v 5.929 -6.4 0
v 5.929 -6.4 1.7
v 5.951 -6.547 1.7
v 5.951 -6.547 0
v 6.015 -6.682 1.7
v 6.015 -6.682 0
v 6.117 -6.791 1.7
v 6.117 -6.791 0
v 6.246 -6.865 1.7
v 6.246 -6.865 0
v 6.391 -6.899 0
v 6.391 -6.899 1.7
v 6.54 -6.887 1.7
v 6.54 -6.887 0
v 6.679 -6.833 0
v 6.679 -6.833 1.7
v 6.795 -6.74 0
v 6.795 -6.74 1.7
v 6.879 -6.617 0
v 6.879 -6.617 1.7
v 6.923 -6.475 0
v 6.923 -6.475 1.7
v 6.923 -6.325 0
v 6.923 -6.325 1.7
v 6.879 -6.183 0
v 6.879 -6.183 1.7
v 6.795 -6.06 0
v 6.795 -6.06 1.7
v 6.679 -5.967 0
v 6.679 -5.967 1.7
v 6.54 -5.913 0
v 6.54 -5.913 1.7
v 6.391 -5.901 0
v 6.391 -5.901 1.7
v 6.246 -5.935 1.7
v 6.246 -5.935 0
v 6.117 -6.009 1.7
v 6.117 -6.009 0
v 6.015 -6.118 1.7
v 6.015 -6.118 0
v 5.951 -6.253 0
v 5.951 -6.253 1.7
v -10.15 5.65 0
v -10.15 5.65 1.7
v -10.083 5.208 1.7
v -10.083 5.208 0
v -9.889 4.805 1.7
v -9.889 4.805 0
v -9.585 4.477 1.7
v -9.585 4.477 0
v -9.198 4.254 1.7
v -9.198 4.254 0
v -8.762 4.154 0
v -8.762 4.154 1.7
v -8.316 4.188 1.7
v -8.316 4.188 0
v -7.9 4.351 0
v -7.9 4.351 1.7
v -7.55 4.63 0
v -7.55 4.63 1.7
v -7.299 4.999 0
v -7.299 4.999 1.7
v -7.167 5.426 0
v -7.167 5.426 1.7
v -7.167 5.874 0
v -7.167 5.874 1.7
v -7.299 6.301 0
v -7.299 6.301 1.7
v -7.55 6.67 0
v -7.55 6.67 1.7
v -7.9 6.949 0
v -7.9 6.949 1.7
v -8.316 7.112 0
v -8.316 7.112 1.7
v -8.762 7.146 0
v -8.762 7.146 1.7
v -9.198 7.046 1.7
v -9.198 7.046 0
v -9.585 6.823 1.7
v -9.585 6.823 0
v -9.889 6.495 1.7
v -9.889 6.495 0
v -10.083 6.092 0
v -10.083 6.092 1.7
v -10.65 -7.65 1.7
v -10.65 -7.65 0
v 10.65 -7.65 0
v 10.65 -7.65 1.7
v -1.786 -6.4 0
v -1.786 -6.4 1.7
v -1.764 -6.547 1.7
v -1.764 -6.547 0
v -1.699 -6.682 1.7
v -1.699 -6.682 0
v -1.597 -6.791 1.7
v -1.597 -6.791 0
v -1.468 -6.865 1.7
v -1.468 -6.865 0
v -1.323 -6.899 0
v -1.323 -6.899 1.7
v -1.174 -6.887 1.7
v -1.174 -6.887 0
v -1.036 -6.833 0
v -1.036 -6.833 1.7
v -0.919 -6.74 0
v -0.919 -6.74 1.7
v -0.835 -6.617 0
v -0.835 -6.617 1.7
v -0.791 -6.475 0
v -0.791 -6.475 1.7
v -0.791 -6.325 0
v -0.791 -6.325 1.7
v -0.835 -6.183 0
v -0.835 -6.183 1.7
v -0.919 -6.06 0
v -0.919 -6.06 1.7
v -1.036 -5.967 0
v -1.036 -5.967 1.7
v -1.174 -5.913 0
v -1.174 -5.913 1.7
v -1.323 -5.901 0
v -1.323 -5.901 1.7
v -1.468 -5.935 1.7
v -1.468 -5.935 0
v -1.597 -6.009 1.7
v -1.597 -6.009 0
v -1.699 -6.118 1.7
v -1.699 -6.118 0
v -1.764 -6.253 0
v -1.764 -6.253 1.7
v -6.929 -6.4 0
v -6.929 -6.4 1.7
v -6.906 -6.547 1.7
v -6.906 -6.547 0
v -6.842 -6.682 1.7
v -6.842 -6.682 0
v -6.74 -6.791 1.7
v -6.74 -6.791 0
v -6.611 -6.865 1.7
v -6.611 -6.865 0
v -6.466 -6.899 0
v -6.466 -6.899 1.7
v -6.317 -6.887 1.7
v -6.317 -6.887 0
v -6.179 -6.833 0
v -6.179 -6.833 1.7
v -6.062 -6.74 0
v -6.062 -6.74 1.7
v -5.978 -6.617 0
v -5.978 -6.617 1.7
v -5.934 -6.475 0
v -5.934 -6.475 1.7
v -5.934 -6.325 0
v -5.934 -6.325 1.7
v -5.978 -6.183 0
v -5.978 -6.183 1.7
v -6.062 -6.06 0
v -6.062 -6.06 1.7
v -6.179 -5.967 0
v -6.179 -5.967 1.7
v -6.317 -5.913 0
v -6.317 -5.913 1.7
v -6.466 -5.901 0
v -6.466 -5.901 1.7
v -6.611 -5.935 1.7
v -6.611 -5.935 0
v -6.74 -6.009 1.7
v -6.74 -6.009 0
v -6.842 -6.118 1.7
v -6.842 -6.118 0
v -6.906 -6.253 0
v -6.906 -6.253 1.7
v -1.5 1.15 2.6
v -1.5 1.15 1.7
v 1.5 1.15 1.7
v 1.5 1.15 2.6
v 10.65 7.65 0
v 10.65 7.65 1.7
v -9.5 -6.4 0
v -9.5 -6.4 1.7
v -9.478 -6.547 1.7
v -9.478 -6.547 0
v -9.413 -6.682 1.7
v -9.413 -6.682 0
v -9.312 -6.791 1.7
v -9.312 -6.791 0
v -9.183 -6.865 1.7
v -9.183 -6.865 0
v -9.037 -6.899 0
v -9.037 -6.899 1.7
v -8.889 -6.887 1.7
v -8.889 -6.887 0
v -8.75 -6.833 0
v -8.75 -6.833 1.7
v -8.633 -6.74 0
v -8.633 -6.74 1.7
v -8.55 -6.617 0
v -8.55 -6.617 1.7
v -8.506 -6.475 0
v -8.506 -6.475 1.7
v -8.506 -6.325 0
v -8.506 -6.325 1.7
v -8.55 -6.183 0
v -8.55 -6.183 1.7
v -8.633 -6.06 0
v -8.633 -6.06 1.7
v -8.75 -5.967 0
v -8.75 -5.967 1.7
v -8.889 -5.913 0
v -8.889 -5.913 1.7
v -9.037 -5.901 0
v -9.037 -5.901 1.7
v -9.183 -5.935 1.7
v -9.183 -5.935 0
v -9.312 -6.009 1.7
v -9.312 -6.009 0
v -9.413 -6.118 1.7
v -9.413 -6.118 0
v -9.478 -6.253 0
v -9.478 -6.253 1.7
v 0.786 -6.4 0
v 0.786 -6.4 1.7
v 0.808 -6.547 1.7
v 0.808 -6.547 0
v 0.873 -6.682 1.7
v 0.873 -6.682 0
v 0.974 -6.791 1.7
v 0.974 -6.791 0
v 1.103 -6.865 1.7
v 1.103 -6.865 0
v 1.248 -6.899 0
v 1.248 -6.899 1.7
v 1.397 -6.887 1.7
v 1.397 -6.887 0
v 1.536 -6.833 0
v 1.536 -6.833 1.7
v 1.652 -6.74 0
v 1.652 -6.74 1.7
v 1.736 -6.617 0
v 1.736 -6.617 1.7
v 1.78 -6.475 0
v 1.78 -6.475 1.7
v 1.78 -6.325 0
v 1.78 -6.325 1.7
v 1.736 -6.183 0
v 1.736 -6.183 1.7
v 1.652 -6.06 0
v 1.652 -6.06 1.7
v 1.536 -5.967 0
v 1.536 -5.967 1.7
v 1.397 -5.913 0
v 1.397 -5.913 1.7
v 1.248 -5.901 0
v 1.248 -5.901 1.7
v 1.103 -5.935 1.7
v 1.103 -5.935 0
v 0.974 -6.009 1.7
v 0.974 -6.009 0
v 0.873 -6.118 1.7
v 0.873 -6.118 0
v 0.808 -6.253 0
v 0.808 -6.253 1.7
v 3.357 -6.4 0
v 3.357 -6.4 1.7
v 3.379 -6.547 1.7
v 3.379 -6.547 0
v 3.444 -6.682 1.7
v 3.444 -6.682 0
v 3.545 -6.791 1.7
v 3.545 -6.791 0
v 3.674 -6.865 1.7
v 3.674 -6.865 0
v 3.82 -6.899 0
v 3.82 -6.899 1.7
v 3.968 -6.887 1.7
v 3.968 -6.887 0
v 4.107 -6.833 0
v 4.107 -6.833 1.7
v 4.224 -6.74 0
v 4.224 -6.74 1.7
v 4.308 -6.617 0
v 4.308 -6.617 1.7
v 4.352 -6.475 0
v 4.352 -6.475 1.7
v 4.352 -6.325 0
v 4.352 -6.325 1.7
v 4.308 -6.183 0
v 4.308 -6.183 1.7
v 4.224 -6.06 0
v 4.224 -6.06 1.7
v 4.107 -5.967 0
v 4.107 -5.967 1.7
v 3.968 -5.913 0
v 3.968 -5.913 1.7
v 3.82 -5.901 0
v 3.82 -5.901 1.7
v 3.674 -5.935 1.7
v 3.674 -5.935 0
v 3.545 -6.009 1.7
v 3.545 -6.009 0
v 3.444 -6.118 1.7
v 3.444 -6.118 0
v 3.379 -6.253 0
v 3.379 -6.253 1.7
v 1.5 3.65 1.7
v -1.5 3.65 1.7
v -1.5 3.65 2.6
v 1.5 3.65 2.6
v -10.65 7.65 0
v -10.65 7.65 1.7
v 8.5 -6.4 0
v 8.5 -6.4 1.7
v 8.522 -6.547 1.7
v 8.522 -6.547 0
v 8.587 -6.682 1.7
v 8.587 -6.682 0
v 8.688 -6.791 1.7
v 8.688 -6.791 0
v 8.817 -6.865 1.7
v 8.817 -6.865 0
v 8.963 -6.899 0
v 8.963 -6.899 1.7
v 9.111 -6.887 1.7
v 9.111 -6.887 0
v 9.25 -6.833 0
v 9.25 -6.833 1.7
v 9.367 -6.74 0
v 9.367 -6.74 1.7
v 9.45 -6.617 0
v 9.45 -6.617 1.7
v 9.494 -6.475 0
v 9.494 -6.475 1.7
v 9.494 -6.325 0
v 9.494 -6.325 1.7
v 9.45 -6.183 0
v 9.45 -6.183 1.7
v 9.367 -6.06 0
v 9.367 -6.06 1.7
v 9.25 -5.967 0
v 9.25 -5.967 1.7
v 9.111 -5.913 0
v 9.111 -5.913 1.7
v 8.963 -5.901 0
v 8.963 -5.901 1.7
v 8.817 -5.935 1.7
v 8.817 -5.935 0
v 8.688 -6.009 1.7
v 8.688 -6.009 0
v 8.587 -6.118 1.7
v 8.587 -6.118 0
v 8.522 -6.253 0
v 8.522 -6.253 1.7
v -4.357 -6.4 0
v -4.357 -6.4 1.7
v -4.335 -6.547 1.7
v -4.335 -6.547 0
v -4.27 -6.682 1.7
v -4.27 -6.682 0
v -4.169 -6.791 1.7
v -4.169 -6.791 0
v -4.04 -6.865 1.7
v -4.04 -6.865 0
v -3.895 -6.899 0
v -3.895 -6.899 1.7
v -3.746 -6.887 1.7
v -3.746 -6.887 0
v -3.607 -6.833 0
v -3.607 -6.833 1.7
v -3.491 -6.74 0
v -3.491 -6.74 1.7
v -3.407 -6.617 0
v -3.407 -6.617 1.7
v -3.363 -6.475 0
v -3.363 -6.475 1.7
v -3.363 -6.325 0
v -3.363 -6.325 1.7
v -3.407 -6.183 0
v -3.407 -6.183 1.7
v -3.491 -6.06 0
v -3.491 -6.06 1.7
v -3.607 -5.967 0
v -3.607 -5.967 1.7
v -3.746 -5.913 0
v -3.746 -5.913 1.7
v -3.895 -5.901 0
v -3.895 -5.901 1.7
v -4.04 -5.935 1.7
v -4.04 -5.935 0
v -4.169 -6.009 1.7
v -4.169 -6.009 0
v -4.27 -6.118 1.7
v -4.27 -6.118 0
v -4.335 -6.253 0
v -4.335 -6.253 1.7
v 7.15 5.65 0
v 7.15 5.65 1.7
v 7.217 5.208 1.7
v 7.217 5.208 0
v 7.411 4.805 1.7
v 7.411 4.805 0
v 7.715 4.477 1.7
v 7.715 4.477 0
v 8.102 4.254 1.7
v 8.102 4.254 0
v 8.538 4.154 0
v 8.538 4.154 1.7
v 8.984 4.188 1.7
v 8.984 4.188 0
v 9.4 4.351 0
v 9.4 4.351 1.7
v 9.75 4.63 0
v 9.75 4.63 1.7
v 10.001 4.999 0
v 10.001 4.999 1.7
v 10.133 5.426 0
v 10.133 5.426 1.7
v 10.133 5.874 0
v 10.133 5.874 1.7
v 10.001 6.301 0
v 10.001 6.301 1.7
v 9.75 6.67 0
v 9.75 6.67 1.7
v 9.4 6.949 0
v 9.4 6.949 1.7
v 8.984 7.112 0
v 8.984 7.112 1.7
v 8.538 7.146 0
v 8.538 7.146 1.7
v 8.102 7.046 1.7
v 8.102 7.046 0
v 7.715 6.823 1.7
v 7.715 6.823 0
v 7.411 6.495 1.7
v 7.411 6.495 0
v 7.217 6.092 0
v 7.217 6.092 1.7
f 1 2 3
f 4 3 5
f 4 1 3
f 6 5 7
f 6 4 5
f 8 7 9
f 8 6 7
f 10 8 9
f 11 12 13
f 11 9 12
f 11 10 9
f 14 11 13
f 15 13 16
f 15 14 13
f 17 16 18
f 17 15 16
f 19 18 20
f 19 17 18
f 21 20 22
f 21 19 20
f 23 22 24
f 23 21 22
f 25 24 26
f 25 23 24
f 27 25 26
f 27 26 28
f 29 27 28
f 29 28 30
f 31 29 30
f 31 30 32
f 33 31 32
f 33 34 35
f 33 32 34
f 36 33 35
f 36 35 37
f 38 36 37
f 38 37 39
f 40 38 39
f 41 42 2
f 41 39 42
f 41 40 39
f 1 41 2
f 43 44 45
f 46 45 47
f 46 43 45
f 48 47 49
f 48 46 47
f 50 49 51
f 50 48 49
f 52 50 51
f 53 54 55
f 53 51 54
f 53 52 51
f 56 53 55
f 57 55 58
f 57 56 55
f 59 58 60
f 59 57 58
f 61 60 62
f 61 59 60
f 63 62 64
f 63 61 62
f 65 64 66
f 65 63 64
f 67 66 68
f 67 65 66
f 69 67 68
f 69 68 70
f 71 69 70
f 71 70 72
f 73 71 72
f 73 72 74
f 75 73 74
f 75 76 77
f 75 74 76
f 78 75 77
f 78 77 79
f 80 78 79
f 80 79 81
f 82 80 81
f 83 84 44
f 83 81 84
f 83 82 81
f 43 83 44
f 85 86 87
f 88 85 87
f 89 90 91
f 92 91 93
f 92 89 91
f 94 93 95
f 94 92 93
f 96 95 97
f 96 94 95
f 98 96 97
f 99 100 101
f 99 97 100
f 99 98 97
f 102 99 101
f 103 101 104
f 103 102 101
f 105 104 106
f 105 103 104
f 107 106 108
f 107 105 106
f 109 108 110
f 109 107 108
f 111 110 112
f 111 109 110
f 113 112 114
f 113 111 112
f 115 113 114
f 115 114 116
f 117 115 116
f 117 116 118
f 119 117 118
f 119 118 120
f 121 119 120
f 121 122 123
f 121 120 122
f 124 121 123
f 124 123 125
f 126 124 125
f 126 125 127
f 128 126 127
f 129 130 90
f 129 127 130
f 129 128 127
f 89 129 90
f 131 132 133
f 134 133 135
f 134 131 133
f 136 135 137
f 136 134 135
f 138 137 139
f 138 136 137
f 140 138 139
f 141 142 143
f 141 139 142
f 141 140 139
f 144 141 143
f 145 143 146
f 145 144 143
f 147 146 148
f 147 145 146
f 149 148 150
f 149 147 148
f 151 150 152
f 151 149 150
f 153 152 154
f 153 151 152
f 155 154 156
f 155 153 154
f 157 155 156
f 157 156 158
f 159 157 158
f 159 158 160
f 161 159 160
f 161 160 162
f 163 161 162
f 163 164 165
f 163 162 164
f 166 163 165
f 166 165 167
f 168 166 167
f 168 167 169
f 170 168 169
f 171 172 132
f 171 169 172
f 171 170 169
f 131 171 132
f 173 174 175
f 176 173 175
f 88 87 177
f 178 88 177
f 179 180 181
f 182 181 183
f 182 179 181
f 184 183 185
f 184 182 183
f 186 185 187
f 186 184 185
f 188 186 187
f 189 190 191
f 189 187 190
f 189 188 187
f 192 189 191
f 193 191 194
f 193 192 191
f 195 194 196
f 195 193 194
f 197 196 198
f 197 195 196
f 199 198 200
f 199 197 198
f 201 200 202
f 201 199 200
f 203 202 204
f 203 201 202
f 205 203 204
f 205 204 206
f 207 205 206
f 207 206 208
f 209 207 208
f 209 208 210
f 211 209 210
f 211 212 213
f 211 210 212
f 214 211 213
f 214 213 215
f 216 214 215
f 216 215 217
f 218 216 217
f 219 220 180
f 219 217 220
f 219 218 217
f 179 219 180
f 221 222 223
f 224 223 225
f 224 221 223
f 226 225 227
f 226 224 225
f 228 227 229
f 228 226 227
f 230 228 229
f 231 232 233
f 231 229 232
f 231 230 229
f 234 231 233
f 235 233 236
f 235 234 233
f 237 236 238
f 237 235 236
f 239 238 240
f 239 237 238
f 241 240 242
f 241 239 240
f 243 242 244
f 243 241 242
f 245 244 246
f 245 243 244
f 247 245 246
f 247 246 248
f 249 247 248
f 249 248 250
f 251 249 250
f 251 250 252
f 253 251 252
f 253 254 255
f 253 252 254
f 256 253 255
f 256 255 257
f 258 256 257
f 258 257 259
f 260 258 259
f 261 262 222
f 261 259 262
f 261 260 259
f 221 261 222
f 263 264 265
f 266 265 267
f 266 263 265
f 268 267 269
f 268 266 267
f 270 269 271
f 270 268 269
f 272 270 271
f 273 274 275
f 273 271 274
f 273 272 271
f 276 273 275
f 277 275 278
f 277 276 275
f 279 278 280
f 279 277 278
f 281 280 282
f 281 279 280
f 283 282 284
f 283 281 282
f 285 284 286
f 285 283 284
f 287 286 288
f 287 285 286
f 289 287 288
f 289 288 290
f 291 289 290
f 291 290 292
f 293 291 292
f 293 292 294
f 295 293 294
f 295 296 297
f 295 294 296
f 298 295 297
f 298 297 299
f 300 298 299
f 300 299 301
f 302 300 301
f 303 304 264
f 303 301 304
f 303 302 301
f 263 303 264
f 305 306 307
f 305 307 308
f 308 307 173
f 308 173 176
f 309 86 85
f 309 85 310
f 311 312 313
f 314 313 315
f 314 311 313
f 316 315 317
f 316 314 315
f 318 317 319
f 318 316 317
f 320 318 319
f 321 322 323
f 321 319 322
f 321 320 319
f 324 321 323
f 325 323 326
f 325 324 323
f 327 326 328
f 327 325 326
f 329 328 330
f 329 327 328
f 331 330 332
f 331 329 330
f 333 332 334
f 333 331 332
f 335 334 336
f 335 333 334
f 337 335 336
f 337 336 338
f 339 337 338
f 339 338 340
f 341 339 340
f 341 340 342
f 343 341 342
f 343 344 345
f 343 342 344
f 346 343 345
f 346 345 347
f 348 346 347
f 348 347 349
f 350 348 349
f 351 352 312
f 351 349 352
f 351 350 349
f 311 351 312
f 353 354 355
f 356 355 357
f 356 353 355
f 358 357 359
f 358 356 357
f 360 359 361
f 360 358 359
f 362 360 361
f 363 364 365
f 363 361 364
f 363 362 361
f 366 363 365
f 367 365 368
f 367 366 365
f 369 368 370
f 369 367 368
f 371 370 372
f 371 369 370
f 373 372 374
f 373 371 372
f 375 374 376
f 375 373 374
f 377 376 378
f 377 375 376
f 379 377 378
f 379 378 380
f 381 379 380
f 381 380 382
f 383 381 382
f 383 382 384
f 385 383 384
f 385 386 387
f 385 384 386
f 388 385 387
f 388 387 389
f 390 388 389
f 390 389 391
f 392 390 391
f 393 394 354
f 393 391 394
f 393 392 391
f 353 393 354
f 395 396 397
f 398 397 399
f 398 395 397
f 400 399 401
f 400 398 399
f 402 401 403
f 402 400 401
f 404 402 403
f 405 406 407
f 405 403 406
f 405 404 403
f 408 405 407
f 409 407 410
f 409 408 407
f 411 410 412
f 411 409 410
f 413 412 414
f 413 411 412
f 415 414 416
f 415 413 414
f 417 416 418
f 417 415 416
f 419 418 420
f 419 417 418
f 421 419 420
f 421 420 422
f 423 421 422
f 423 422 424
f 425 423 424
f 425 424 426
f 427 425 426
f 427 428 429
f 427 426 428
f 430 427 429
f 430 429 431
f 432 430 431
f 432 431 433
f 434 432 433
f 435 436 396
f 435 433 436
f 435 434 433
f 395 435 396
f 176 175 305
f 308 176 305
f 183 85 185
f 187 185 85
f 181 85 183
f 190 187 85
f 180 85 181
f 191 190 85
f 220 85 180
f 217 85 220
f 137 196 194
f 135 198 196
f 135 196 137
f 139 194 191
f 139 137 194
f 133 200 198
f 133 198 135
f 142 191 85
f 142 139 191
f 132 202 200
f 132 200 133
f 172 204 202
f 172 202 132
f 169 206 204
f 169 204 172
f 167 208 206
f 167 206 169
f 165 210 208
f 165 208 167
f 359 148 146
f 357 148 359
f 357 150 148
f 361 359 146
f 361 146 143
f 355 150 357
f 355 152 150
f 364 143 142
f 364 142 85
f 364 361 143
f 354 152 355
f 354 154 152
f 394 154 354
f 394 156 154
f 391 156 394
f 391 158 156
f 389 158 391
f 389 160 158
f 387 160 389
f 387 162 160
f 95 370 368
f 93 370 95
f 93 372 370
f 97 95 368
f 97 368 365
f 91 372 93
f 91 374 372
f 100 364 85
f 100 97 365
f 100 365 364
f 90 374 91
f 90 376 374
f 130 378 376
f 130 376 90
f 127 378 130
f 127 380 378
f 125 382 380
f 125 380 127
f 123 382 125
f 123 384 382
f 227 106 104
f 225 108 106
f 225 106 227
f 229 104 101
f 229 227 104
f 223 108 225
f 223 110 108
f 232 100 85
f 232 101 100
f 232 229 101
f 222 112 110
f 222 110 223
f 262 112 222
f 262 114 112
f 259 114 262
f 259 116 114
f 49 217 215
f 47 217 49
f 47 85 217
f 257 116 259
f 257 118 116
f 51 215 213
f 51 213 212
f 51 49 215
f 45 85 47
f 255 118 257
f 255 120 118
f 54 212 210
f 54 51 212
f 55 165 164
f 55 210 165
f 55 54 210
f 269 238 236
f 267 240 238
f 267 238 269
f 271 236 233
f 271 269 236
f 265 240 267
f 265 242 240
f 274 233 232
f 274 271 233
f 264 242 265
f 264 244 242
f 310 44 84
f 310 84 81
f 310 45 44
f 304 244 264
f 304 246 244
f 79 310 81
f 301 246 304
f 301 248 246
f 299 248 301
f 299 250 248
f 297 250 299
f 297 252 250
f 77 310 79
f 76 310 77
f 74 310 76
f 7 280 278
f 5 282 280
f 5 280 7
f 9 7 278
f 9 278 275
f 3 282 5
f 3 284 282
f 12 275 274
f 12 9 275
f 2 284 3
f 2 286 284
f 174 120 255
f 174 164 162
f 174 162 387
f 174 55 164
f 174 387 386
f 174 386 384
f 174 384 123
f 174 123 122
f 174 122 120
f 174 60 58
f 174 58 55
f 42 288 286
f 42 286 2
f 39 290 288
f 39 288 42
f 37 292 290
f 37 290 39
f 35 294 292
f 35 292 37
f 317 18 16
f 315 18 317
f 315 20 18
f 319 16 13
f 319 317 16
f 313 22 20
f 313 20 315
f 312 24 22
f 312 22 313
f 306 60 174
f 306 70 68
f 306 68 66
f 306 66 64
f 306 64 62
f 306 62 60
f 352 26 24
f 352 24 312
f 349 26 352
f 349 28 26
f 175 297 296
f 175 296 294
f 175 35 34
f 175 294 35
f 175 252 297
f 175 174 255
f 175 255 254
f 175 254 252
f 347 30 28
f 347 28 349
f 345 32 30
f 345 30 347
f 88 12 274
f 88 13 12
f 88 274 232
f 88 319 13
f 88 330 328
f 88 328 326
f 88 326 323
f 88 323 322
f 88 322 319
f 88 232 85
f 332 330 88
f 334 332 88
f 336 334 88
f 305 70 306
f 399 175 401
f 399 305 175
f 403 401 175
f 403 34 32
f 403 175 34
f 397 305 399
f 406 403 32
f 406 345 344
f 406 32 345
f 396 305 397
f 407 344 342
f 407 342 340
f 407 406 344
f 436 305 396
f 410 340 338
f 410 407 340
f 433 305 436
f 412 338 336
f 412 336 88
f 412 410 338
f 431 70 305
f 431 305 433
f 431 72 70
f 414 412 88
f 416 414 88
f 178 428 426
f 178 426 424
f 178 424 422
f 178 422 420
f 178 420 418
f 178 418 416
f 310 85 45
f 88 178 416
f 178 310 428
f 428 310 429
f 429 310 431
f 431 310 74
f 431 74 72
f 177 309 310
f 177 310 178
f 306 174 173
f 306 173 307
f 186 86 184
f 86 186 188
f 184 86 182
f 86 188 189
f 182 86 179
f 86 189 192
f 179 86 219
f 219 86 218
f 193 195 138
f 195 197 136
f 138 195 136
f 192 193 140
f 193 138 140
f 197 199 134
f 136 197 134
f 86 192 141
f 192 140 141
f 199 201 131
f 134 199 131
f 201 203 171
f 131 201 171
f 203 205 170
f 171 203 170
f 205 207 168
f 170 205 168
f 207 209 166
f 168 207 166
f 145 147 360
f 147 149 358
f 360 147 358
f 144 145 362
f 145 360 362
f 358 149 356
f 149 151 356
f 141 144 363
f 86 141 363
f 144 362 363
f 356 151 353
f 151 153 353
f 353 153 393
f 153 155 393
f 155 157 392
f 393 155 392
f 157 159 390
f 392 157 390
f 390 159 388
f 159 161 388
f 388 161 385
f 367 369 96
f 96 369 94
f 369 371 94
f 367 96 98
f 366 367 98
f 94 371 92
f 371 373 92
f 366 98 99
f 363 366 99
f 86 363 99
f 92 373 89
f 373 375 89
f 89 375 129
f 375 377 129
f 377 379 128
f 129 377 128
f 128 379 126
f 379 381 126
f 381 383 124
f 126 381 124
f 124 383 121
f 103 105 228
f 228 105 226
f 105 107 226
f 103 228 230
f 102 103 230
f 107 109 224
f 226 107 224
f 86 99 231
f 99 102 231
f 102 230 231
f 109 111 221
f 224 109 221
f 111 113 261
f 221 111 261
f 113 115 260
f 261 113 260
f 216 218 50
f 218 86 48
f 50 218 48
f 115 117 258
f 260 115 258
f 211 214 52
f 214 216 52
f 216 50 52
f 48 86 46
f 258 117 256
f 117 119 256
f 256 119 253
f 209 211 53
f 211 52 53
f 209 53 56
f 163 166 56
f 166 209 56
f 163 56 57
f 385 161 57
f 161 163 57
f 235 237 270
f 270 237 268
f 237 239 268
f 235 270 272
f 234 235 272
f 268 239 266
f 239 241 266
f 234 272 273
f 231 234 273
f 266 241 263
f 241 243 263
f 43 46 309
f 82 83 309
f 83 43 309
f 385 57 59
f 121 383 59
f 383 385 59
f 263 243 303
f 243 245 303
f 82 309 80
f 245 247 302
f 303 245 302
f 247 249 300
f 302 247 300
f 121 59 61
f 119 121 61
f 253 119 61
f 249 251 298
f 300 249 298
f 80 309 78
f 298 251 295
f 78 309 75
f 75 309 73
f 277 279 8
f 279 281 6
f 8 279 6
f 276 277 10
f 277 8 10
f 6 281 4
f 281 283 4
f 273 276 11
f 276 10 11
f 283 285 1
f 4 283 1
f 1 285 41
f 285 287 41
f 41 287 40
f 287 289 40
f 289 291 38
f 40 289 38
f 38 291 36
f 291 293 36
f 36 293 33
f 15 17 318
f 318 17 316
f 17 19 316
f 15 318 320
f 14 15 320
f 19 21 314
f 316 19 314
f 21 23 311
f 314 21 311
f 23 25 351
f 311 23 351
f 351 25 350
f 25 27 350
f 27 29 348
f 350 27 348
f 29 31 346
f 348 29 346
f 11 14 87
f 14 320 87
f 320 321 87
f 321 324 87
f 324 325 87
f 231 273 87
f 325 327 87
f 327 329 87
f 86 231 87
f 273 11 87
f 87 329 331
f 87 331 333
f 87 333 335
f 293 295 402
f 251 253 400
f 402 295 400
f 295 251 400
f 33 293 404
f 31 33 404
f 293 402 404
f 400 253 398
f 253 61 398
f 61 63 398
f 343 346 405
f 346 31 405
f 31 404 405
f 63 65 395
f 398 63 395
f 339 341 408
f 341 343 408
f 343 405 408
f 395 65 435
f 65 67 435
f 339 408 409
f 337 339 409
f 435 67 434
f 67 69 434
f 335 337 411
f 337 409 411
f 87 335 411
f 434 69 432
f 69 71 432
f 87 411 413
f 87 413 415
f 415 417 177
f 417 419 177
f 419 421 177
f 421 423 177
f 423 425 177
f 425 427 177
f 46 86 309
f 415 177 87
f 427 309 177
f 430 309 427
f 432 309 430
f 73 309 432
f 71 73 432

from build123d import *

# Parameters (mm, degrees)
SKETCH1_W           = 21.3
SKETCH1_H           = 15.3
BOSS_EXTRUDE1_DEPTH = 1.7
BOSS_EXTRUDE2_START = 1.7
SKETCH1_3_W         = 3
SKETCH1_3_H         = 2.5
BOSS_EXTRUDE2_DEPTH = 0.9
SKETCH1_4_R         = 0.5
SKETCH1_4_R_2       = 1.5
CUT_EXTRUDE1_DEPTH  = 14.368058947


with BuildPart() as part:
    # Sketch1 → Boss-Extrude1 (new body)
    with BuildSketch(Plane.XY):
        Rectangle(SKETCH1_W, SKETCH1_H)
    extrude(amount=BOSS_EXTRUDE1_DEPTH)

    # Sketch1<3> → Boss-Extrude2 (add)
    with BuildSketch(Plane.XY.offset(BOSS_EXTRUDE2_START)):
        with Locations((0, 2.4)):
            Rectangle(SKETCH1_3_W, SKETCH1_3_H)
    extrude(amount=BOSS_EXTRUDE2_DEPTH)

    # Sketch1<4> → Cut-Extrude1 (cut, through all)
    with BuildSketch(Plane.XY):
        with Locations(Location((3.857142857, -6.4, 0), (0, 0, 180))):
            Circle(SKETCH1_4_R)
        with Locations(Location((-8.65, 5.65, 0), (0, 0, 180))):
            Circle(SKETCH1_4_R_2)
        with Locations(Location((8.65, 5.65, 0), (0, 0, 180))):
            Circle(SKETCH1_4_R_2)
        with Locations(Location((-9, -6.4, 0), (0, 0, 180))):
            Circle(SKETCH1_4_R)
        with Locations(Location((-6.428571429, -6.4, 0), (0, 0, 180))):
            Circle(SKETCH1_4_R)
        with Locations(Location((-3.857142857, -6.4, 0), (0, 0, 180))):
            Circle(SKETCH1_4_R)
        with Locations(Location((-1.285714286, -6.4, 0), (0, 0, 180))):
            Circle(SKETCH1_4_R)
        with Locations(Location((1.285714286, -6.4, 0), (0, 0, 180))):
            Circle(SKETCH1_4_R)
        with Locations(Location((6.428571429, -6.4, 0), (0, 0, 180))):
            Circle(SKETCH1_4_R)
        with Locations(Location((9, -6.4, 0), (0, 0, 180))):
            Circle(SKETCH1_4_R)
    extrude(amount=CUT_EXTRUDE1_DEPTH, mode=Mode.SUBTRACT)


solid = part.part
